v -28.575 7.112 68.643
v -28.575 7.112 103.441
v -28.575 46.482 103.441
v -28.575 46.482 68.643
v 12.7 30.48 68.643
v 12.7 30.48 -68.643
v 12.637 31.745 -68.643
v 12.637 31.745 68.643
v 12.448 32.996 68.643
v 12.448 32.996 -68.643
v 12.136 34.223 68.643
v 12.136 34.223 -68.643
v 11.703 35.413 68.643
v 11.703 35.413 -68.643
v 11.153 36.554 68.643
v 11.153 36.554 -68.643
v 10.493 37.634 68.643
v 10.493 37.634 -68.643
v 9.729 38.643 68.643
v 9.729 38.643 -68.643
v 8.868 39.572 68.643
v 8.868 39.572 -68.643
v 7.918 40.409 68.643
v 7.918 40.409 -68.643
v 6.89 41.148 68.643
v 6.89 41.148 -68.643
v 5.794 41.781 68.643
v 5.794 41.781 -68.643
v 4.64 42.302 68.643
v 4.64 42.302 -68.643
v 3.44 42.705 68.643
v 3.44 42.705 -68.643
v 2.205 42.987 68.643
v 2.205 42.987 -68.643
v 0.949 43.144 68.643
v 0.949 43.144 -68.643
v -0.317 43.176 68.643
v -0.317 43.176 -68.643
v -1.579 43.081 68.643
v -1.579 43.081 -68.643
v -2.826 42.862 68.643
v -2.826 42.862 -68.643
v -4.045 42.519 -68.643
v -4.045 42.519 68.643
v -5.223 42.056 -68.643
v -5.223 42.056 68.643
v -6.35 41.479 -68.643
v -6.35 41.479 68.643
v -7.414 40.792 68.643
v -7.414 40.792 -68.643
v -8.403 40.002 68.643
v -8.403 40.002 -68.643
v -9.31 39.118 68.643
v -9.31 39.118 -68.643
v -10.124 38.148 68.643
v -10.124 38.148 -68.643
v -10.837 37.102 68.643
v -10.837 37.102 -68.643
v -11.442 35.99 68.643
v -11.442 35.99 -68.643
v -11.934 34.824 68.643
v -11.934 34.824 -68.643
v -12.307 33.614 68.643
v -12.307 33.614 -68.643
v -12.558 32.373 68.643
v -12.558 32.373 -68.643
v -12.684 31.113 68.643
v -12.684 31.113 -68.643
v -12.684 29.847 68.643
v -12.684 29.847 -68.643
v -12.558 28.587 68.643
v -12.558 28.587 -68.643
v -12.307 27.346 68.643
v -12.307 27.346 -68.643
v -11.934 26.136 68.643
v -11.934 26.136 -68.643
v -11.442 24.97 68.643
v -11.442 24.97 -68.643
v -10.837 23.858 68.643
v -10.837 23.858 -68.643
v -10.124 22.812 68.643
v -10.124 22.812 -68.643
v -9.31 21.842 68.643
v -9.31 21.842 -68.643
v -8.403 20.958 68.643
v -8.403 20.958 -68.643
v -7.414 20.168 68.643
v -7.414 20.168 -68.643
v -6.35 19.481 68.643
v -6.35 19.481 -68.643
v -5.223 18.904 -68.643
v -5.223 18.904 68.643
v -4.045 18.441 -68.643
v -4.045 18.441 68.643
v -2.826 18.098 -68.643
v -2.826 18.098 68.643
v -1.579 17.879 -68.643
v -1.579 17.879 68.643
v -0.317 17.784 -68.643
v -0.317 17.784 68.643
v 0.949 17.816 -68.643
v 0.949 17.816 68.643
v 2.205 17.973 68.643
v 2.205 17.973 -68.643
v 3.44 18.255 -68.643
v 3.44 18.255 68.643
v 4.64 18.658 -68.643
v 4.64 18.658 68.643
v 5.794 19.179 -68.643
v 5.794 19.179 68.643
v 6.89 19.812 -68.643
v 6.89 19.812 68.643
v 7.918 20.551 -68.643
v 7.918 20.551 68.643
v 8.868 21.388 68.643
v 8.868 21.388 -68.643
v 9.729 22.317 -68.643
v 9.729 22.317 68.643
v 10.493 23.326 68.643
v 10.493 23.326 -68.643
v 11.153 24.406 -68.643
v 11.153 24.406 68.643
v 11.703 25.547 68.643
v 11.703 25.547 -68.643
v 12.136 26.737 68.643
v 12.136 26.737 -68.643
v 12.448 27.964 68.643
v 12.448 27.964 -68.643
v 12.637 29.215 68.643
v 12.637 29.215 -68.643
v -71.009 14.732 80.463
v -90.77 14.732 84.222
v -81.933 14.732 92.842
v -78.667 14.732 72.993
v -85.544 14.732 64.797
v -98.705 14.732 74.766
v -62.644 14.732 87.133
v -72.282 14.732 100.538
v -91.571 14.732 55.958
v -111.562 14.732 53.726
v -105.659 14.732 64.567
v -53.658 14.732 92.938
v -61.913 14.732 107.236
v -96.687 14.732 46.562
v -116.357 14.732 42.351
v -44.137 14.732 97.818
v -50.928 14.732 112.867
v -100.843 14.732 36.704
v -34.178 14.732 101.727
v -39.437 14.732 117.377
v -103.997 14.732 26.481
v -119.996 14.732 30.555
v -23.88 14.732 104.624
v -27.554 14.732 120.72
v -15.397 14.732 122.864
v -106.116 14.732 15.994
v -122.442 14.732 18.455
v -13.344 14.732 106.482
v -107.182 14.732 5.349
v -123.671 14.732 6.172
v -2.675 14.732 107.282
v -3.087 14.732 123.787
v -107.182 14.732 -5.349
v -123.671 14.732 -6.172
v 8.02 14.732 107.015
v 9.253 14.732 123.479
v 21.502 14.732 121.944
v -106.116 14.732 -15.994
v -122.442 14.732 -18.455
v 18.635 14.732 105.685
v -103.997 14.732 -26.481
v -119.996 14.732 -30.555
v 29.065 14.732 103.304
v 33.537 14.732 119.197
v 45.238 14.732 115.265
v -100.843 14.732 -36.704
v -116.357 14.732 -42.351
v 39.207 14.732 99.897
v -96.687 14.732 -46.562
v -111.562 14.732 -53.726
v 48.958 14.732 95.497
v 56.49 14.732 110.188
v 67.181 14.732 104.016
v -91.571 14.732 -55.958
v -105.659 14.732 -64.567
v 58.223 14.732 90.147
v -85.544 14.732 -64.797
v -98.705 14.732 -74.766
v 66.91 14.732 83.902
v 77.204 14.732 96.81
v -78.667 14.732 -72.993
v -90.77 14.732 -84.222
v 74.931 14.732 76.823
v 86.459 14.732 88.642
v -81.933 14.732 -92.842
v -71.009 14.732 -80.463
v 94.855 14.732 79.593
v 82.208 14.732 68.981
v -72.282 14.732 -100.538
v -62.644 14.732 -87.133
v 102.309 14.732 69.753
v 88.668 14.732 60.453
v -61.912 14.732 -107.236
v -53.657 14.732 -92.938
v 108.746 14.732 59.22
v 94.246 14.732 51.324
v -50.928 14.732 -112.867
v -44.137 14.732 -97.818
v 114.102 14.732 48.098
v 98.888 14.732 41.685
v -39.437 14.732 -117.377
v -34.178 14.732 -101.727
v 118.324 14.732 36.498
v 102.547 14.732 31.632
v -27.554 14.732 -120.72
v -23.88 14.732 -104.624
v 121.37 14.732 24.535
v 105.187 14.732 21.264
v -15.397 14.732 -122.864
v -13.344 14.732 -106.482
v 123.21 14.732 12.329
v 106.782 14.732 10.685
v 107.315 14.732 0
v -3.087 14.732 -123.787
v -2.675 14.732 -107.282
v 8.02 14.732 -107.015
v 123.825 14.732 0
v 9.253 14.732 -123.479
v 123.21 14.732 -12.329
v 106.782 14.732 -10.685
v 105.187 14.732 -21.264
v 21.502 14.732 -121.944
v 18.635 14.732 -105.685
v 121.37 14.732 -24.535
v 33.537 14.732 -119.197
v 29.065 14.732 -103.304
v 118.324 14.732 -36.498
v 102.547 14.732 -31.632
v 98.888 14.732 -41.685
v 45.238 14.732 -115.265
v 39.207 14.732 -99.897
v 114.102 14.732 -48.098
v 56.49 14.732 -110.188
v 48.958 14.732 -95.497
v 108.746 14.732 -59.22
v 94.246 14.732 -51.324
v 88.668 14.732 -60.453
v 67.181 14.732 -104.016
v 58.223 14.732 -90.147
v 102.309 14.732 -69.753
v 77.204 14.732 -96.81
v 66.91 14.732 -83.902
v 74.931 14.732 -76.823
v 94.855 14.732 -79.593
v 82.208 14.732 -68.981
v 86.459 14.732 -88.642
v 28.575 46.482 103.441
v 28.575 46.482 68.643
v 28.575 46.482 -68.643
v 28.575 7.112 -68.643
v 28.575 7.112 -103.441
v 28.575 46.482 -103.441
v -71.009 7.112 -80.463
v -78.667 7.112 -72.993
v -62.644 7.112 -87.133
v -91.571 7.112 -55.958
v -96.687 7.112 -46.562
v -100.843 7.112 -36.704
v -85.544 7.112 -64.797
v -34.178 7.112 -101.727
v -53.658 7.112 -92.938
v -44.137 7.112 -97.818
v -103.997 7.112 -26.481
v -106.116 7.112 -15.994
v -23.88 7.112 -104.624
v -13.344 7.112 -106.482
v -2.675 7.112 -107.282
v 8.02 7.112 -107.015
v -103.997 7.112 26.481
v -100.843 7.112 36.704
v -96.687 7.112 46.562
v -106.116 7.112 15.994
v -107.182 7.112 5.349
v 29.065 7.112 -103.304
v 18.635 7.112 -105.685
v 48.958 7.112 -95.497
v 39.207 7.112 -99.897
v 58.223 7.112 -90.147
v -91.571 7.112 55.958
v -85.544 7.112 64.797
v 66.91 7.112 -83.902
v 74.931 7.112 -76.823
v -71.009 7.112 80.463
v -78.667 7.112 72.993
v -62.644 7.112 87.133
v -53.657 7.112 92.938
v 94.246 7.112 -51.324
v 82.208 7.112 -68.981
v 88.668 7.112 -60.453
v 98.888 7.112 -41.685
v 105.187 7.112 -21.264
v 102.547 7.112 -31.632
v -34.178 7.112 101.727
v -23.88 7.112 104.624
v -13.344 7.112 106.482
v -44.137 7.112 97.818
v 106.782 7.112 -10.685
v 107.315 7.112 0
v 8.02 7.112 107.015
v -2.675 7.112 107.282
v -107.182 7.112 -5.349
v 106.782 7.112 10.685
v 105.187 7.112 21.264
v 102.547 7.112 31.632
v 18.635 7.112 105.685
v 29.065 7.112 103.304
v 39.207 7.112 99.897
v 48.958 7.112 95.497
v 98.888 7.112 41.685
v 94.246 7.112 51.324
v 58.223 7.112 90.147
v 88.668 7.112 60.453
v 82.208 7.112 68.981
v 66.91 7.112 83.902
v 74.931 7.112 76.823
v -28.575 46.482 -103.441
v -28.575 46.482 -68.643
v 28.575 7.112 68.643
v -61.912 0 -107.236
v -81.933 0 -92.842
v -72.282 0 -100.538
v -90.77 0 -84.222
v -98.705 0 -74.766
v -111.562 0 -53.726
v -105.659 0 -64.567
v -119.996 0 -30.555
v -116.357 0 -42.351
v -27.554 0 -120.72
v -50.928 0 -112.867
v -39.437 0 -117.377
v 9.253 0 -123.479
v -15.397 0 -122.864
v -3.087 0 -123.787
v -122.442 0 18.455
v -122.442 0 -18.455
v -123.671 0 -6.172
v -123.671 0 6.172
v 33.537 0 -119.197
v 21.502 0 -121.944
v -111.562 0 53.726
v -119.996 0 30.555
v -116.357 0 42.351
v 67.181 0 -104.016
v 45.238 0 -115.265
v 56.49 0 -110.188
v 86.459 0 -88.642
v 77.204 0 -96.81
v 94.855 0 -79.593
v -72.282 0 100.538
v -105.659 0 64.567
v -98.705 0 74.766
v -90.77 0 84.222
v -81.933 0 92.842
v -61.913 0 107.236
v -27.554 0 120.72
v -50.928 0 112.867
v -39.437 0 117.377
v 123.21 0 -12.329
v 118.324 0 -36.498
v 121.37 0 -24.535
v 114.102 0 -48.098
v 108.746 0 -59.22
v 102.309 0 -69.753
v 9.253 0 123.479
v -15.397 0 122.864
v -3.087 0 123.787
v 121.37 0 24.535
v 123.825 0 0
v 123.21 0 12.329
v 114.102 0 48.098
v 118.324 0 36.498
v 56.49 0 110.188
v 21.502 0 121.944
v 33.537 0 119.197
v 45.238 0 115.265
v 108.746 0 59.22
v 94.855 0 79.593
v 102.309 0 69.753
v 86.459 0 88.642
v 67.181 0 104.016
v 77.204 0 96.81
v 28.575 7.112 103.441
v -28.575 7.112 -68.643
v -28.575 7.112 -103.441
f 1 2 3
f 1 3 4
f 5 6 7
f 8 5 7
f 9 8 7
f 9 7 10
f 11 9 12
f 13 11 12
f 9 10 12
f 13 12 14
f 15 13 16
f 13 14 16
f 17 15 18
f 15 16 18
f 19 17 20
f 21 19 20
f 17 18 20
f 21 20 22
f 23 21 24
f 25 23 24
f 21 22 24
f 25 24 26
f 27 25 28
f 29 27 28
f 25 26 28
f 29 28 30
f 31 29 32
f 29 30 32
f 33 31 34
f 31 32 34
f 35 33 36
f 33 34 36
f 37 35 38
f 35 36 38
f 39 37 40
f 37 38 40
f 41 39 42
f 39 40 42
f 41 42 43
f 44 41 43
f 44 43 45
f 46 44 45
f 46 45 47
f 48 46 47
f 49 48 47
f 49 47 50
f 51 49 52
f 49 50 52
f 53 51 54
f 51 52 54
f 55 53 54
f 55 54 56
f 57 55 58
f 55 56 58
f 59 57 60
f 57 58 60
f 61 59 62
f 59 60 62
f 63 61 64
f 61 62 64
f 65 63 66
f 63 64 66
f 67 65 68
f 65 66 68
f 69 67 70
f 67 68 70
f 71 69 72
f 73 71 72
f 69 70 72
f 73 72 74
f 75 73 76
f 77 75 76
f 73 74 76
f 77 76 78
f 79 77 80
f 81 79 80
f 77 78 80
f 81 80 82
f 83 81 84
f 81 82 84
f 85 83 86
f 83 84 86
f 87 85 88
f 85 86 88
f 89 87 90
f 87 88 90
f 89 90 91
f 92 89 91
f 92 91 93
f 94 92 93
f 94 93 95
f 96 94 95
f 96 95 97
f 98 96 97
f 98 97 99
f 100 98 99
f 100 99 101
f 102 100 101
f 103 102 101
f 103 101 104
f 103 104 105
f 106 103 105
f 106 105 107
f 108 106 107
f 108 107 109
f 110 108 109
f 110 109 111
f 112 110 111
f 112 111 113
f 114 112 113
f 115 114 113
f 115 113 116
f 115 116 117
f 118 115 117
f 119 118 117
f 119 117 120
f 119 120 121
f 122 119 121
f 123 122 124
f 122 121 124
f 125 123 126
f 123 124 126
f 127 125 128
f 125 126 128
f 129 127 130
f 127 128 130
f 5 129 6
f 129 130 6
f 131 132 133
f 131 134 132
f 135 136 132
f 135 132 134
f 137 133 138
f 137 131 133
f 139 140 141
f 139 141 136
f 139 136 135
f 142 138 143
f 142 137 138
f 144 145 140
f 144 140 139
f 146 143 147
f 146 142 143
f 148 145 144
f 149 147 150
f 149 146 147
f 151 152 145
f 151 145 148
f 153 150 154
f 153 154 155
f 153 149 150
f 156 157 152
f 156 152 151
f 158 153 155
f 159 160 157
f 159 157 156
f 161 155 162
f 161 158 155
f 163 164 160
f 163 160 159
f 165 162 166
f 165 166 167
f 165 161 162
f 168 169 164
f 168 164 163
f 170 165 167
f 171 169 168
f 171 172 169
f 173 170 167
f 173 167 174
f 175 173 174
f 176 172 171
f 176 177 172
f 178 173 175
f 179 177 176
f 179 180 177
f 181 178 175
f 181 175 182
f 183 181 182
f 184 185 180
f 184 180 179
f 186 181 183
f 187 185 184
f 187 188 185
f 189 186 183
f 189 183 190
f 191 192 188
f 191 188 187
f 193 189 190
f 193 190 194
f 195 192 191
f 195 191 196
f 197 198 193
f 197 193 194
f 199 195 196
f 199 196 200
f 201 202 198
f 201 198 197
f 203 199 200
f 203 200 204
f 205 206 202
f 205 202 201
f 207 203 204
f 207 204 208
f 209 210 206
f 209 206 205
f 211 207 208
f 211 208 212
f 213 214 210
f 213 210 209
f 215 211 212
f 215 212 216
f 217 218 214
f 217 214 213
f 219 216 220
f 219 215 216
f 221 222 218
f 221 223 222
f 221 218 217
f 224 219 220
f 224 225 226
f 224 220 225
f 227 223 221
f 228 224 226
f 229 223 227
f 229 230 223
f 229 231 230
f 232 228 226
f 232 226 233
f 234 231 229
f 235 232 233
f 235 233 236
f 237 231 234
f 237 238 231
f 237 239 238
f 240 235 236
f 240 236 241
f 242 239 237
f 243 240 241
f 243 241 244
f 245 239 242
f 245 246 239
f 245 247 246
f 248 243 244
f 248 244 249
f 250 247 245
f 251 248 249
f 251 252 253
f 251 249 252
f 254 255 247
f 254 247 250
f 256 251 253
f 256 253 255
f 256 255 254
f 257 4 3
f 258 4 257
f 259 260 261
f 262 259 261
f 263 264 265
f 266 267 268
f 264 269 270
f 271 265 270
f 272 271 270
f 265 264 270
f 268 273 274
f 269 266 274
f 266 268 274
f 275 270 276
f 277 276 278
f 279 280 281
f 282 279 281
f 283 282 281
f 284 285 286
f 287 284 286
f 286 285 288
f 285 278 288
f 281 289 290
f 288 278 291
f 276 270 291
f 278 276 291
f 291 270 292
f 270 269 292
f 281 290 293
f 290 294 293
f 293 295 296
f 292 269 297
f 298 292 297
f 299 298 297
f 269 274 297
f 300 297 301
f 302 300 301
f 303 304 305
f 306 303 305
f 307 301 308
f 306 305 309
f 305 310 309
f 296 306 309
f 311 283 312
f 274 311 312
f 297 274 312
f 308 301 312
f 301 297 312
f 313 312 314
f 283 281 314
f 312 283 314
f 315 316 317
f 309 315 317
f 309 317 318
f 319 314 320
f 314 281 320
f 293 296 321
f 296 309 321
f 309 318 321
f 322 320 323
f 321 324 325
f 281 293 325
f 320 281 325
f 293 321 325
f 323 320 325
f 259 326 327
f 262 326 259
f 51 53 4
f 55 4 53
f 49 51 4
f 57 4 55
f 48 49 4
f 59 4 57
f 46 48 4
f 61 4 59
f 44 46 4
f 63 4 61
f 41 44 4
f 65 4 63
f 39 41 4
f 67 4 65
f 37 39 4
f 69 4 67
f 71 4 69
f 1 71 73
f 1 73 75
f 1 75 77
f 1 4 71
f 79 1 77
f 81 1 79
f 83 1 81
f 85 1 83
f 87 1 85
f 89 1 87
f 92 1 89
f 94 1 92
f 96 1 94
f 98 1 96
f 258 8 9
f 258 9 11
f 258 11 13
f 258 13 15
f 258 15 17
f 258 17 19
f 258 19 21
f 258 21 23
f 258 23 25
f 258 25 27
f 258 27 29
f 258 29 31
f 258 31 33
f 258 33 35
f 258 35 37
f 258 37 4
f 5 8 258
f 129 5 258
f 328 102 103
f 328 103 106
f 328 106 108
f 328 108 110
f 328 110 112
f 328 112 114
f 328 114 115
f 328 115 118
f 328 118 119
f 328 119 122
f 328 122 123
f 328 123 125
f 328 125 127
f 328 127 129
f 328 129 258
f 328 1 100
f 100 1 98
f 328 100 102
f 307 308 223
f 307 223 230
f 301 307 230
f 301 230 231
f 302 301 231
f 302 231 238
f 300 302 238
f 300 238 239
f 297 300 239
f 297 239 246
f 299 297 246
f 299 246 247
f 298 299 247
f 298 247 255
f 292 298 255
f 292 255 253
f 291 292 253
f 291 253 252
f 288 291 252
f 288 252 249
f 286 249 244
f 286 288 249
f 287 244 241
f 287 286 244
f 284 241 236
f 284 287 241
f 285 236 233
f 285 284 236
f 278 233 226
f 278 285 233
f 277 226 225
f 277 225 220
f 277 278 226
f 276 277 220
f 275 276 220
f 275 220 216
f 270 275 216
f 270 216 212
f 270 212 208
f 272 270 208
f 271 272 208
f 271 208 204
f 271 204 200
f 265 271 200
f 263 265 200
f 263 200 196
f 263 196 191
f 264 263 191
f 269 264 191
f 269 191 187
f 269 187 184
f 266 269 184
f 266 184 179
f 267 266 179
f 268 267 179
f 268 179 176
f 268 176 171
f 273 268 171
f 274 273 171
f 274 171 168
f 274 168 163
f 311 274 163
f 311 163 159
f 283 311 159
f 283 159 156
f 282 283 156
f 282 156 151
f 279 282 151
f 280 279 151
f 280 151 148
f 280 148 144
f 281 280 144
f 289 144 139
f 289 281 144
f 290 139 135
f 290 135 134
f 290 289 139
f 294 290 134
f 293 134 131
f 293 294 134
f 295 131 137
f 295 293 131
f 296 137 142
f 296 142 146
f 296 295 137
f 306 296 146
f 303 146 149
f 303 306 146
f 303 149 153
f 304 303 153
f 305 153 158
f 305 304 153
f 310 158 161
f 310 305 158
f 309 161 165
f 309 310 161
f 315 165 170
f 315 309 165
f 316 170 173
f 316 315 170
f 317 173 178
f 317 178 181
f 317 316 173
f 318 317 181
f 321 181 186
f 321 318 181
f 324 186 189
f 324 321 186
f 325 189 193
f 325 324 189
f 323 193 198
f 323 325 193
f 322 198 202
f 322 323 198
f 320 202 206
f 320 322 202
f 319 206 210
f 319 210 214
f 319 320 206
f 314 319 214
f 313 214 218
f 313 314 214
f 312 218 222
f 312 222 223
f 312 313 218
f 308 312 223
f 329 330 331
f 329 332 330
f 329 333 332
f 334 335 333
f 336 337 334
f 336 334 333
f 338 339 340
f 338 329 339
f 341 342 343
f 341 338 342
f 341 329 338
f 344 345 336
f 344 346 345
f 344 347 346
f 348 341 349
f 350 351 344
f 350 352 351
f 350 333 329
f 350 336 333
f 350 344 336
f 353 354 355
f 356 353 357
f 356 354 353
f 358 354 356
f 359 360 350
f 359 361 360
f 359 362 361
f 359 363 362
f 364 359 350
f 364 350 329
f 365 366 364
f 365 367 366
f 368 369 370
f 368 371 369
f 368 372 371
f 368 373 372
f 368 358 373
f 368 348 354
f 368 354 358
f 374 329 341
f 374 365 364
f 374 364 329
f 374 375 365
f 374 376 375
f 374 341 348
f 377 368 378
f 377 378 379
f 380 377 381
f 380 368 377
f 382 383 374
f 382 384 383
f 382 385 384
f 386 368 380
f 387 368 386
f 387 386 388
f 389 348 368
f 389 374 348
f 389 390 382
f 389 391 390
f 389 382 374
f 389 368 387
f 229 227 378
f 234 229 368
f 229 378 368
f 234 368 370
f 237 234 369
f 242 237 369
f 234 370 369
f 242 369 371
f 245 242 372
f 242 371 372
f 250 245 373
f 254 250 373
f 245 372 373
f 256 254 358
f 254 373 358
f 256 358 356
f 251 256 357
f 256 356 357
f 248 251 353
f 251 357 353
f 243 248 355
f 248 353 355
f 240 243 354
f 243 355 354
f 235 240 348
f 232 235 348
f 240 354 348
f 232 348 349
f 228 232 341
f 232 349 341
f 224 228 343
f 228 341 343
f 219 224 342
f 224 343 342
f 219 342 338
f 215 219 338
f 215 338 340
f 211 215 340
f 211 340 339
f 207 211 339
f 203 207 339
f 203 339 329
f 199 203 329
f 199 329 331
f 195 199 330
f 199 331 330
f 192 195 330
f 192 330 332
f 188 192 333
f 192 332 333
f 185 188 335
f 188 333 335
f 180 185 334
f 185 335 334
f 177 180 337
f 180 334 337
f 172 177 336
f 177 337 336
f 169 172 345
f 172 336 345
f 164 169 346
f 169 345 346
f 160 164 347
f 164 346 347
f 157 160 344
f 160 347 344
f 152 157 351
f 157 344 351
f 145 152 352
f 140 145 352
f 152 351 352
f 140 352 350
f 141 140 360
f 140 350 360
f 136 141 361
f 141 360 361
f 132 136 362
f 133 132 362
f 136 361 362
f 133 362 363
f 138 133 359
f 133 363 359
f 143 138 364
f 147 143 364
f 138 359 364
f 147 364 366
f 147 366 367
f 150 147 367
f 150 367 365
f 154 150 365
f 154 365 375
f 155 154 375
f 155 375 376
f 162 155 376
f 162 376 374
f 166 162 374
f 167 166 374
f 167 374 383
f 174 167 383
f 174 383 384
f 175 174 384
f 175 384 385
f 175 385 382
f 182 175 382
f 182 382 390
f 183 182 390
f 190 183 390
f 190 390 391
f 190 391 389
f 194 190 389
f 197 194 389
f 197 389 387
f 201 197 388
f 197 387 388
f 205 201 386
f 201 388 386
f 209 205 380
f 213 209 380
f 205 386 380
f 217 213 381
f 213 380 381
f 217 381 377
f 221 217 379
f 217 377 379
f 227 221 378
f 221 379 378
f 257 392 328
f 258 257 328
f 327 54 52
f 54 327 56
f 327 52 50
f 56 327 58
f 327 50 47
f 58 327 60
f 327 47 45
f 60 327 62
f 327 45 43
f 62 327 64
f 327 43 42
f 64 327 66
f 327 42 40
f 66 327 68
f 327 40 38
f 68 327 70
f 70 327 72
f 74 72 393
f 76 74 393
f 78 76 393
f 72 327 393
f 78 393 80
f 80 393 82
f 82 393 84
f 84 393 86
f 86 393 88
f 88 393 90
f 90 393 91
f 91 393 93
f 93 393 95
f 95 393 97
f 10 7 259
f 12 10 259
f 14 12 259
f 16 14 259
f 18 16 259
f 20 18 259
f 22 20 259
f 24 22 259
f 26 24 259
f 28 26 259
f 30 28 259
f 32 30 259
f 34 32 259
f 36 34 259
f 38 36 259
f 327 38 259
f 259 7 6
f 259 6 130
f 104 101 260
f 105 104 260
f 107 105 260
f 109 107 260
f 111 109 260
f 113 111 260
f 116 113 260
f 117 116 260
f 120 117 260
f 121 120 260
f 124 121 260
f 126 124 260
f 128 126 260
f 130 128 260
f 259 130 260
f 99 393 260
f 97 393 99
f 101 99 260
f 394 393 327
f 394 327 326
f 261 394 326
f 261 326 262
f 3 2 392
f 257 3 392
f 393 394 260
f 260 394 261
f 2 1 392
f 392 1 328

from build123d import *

# Parameters (mm, degrees)
SKETCH1_R             = 123.825
SKETCH1_R_2           = 107.315
BOSS_EXTRUDE1_DEPTH   = 14.732
SKETCH2_R             = 107.315
BOSS_EXTRUDE2_DEPTH   = 7.112
SKETCH3_W             = 57.15
SKETCH3_H             = 34.798
BOSS_EXTRUDE9_DEPTH   = 39.37
BOSS_EXTRUDE9_2_DEPTH = 39.37
SKETCH4_R             = 12.7
BOSS_EXTRUDE10_DEPTH  = 137.285402


with BuildPart() as part:
    # Sketch1 → Boss-Extrude1 (new body)
    with BuildSketch(Plane(origin=(0, 0, 0), x_dir=(1, 0, 0), z_dir=(0, 1, 0))):
        Circle(SKETCH1_R)
        Circle(SKETCH1_R_2, mode=Mode.SUBTRACT)
    extrude(amount=BOSS_EXTRUDE1_DEPTH)

    # Sketch2 → Boss-Extrude2 (add)
    with BuildSketch(Plane.XZ):
        Circle(SKETCH2_R)
    extrude(amount=-BOSS_EXTRUDE2_DEPTH)


with BuildPart() as body_2:
    # Sketch3 → Boss-Extrude9 (new body)
    with BuildSketch(Plane(origin=(0, 7.112, 0), x_dir=(1, 0, 0), z_dir=(0, 1, 0))):
        with Locations((0, -86.041700887)):
            Rectangle(SKETCH3_W, SKETCH3_H)
    extrude(amount=BOSS_EXTRUDE9_DEPTH)



with BuildPart() as body_3:
    # Sketch3 → Boss-Extrude9 2 (new body)
    with BuildSketch(Plane(origin=(0, 7.112, 0), x_dir=(1, 0, 0), z_dir=(0, 1, 0))):
        with Locations((0, 86.041700887)):
            Rectangle(SKETCH3_W, SKETCH3_H)
    extrude(amount=BOSS_EXTRUDE9_2_DEPTH)


with BuildPart() as body_2_1:
    add(body_2.part)

    add(body_3.part)  # Boss-Extrude10 merges body 3
    # Sketch4 → Boss-Extrude10 (add)
    with BuildSketch(Plane.XY.offset(-68.642700887)):
        with Locations((0, 30.48)):
            Circle(SKETCH4_R)
    extrude(amount=BOSS_EXTRUDE10_DEPTH)


solid = Compound([part.part, body_2_1.part])
